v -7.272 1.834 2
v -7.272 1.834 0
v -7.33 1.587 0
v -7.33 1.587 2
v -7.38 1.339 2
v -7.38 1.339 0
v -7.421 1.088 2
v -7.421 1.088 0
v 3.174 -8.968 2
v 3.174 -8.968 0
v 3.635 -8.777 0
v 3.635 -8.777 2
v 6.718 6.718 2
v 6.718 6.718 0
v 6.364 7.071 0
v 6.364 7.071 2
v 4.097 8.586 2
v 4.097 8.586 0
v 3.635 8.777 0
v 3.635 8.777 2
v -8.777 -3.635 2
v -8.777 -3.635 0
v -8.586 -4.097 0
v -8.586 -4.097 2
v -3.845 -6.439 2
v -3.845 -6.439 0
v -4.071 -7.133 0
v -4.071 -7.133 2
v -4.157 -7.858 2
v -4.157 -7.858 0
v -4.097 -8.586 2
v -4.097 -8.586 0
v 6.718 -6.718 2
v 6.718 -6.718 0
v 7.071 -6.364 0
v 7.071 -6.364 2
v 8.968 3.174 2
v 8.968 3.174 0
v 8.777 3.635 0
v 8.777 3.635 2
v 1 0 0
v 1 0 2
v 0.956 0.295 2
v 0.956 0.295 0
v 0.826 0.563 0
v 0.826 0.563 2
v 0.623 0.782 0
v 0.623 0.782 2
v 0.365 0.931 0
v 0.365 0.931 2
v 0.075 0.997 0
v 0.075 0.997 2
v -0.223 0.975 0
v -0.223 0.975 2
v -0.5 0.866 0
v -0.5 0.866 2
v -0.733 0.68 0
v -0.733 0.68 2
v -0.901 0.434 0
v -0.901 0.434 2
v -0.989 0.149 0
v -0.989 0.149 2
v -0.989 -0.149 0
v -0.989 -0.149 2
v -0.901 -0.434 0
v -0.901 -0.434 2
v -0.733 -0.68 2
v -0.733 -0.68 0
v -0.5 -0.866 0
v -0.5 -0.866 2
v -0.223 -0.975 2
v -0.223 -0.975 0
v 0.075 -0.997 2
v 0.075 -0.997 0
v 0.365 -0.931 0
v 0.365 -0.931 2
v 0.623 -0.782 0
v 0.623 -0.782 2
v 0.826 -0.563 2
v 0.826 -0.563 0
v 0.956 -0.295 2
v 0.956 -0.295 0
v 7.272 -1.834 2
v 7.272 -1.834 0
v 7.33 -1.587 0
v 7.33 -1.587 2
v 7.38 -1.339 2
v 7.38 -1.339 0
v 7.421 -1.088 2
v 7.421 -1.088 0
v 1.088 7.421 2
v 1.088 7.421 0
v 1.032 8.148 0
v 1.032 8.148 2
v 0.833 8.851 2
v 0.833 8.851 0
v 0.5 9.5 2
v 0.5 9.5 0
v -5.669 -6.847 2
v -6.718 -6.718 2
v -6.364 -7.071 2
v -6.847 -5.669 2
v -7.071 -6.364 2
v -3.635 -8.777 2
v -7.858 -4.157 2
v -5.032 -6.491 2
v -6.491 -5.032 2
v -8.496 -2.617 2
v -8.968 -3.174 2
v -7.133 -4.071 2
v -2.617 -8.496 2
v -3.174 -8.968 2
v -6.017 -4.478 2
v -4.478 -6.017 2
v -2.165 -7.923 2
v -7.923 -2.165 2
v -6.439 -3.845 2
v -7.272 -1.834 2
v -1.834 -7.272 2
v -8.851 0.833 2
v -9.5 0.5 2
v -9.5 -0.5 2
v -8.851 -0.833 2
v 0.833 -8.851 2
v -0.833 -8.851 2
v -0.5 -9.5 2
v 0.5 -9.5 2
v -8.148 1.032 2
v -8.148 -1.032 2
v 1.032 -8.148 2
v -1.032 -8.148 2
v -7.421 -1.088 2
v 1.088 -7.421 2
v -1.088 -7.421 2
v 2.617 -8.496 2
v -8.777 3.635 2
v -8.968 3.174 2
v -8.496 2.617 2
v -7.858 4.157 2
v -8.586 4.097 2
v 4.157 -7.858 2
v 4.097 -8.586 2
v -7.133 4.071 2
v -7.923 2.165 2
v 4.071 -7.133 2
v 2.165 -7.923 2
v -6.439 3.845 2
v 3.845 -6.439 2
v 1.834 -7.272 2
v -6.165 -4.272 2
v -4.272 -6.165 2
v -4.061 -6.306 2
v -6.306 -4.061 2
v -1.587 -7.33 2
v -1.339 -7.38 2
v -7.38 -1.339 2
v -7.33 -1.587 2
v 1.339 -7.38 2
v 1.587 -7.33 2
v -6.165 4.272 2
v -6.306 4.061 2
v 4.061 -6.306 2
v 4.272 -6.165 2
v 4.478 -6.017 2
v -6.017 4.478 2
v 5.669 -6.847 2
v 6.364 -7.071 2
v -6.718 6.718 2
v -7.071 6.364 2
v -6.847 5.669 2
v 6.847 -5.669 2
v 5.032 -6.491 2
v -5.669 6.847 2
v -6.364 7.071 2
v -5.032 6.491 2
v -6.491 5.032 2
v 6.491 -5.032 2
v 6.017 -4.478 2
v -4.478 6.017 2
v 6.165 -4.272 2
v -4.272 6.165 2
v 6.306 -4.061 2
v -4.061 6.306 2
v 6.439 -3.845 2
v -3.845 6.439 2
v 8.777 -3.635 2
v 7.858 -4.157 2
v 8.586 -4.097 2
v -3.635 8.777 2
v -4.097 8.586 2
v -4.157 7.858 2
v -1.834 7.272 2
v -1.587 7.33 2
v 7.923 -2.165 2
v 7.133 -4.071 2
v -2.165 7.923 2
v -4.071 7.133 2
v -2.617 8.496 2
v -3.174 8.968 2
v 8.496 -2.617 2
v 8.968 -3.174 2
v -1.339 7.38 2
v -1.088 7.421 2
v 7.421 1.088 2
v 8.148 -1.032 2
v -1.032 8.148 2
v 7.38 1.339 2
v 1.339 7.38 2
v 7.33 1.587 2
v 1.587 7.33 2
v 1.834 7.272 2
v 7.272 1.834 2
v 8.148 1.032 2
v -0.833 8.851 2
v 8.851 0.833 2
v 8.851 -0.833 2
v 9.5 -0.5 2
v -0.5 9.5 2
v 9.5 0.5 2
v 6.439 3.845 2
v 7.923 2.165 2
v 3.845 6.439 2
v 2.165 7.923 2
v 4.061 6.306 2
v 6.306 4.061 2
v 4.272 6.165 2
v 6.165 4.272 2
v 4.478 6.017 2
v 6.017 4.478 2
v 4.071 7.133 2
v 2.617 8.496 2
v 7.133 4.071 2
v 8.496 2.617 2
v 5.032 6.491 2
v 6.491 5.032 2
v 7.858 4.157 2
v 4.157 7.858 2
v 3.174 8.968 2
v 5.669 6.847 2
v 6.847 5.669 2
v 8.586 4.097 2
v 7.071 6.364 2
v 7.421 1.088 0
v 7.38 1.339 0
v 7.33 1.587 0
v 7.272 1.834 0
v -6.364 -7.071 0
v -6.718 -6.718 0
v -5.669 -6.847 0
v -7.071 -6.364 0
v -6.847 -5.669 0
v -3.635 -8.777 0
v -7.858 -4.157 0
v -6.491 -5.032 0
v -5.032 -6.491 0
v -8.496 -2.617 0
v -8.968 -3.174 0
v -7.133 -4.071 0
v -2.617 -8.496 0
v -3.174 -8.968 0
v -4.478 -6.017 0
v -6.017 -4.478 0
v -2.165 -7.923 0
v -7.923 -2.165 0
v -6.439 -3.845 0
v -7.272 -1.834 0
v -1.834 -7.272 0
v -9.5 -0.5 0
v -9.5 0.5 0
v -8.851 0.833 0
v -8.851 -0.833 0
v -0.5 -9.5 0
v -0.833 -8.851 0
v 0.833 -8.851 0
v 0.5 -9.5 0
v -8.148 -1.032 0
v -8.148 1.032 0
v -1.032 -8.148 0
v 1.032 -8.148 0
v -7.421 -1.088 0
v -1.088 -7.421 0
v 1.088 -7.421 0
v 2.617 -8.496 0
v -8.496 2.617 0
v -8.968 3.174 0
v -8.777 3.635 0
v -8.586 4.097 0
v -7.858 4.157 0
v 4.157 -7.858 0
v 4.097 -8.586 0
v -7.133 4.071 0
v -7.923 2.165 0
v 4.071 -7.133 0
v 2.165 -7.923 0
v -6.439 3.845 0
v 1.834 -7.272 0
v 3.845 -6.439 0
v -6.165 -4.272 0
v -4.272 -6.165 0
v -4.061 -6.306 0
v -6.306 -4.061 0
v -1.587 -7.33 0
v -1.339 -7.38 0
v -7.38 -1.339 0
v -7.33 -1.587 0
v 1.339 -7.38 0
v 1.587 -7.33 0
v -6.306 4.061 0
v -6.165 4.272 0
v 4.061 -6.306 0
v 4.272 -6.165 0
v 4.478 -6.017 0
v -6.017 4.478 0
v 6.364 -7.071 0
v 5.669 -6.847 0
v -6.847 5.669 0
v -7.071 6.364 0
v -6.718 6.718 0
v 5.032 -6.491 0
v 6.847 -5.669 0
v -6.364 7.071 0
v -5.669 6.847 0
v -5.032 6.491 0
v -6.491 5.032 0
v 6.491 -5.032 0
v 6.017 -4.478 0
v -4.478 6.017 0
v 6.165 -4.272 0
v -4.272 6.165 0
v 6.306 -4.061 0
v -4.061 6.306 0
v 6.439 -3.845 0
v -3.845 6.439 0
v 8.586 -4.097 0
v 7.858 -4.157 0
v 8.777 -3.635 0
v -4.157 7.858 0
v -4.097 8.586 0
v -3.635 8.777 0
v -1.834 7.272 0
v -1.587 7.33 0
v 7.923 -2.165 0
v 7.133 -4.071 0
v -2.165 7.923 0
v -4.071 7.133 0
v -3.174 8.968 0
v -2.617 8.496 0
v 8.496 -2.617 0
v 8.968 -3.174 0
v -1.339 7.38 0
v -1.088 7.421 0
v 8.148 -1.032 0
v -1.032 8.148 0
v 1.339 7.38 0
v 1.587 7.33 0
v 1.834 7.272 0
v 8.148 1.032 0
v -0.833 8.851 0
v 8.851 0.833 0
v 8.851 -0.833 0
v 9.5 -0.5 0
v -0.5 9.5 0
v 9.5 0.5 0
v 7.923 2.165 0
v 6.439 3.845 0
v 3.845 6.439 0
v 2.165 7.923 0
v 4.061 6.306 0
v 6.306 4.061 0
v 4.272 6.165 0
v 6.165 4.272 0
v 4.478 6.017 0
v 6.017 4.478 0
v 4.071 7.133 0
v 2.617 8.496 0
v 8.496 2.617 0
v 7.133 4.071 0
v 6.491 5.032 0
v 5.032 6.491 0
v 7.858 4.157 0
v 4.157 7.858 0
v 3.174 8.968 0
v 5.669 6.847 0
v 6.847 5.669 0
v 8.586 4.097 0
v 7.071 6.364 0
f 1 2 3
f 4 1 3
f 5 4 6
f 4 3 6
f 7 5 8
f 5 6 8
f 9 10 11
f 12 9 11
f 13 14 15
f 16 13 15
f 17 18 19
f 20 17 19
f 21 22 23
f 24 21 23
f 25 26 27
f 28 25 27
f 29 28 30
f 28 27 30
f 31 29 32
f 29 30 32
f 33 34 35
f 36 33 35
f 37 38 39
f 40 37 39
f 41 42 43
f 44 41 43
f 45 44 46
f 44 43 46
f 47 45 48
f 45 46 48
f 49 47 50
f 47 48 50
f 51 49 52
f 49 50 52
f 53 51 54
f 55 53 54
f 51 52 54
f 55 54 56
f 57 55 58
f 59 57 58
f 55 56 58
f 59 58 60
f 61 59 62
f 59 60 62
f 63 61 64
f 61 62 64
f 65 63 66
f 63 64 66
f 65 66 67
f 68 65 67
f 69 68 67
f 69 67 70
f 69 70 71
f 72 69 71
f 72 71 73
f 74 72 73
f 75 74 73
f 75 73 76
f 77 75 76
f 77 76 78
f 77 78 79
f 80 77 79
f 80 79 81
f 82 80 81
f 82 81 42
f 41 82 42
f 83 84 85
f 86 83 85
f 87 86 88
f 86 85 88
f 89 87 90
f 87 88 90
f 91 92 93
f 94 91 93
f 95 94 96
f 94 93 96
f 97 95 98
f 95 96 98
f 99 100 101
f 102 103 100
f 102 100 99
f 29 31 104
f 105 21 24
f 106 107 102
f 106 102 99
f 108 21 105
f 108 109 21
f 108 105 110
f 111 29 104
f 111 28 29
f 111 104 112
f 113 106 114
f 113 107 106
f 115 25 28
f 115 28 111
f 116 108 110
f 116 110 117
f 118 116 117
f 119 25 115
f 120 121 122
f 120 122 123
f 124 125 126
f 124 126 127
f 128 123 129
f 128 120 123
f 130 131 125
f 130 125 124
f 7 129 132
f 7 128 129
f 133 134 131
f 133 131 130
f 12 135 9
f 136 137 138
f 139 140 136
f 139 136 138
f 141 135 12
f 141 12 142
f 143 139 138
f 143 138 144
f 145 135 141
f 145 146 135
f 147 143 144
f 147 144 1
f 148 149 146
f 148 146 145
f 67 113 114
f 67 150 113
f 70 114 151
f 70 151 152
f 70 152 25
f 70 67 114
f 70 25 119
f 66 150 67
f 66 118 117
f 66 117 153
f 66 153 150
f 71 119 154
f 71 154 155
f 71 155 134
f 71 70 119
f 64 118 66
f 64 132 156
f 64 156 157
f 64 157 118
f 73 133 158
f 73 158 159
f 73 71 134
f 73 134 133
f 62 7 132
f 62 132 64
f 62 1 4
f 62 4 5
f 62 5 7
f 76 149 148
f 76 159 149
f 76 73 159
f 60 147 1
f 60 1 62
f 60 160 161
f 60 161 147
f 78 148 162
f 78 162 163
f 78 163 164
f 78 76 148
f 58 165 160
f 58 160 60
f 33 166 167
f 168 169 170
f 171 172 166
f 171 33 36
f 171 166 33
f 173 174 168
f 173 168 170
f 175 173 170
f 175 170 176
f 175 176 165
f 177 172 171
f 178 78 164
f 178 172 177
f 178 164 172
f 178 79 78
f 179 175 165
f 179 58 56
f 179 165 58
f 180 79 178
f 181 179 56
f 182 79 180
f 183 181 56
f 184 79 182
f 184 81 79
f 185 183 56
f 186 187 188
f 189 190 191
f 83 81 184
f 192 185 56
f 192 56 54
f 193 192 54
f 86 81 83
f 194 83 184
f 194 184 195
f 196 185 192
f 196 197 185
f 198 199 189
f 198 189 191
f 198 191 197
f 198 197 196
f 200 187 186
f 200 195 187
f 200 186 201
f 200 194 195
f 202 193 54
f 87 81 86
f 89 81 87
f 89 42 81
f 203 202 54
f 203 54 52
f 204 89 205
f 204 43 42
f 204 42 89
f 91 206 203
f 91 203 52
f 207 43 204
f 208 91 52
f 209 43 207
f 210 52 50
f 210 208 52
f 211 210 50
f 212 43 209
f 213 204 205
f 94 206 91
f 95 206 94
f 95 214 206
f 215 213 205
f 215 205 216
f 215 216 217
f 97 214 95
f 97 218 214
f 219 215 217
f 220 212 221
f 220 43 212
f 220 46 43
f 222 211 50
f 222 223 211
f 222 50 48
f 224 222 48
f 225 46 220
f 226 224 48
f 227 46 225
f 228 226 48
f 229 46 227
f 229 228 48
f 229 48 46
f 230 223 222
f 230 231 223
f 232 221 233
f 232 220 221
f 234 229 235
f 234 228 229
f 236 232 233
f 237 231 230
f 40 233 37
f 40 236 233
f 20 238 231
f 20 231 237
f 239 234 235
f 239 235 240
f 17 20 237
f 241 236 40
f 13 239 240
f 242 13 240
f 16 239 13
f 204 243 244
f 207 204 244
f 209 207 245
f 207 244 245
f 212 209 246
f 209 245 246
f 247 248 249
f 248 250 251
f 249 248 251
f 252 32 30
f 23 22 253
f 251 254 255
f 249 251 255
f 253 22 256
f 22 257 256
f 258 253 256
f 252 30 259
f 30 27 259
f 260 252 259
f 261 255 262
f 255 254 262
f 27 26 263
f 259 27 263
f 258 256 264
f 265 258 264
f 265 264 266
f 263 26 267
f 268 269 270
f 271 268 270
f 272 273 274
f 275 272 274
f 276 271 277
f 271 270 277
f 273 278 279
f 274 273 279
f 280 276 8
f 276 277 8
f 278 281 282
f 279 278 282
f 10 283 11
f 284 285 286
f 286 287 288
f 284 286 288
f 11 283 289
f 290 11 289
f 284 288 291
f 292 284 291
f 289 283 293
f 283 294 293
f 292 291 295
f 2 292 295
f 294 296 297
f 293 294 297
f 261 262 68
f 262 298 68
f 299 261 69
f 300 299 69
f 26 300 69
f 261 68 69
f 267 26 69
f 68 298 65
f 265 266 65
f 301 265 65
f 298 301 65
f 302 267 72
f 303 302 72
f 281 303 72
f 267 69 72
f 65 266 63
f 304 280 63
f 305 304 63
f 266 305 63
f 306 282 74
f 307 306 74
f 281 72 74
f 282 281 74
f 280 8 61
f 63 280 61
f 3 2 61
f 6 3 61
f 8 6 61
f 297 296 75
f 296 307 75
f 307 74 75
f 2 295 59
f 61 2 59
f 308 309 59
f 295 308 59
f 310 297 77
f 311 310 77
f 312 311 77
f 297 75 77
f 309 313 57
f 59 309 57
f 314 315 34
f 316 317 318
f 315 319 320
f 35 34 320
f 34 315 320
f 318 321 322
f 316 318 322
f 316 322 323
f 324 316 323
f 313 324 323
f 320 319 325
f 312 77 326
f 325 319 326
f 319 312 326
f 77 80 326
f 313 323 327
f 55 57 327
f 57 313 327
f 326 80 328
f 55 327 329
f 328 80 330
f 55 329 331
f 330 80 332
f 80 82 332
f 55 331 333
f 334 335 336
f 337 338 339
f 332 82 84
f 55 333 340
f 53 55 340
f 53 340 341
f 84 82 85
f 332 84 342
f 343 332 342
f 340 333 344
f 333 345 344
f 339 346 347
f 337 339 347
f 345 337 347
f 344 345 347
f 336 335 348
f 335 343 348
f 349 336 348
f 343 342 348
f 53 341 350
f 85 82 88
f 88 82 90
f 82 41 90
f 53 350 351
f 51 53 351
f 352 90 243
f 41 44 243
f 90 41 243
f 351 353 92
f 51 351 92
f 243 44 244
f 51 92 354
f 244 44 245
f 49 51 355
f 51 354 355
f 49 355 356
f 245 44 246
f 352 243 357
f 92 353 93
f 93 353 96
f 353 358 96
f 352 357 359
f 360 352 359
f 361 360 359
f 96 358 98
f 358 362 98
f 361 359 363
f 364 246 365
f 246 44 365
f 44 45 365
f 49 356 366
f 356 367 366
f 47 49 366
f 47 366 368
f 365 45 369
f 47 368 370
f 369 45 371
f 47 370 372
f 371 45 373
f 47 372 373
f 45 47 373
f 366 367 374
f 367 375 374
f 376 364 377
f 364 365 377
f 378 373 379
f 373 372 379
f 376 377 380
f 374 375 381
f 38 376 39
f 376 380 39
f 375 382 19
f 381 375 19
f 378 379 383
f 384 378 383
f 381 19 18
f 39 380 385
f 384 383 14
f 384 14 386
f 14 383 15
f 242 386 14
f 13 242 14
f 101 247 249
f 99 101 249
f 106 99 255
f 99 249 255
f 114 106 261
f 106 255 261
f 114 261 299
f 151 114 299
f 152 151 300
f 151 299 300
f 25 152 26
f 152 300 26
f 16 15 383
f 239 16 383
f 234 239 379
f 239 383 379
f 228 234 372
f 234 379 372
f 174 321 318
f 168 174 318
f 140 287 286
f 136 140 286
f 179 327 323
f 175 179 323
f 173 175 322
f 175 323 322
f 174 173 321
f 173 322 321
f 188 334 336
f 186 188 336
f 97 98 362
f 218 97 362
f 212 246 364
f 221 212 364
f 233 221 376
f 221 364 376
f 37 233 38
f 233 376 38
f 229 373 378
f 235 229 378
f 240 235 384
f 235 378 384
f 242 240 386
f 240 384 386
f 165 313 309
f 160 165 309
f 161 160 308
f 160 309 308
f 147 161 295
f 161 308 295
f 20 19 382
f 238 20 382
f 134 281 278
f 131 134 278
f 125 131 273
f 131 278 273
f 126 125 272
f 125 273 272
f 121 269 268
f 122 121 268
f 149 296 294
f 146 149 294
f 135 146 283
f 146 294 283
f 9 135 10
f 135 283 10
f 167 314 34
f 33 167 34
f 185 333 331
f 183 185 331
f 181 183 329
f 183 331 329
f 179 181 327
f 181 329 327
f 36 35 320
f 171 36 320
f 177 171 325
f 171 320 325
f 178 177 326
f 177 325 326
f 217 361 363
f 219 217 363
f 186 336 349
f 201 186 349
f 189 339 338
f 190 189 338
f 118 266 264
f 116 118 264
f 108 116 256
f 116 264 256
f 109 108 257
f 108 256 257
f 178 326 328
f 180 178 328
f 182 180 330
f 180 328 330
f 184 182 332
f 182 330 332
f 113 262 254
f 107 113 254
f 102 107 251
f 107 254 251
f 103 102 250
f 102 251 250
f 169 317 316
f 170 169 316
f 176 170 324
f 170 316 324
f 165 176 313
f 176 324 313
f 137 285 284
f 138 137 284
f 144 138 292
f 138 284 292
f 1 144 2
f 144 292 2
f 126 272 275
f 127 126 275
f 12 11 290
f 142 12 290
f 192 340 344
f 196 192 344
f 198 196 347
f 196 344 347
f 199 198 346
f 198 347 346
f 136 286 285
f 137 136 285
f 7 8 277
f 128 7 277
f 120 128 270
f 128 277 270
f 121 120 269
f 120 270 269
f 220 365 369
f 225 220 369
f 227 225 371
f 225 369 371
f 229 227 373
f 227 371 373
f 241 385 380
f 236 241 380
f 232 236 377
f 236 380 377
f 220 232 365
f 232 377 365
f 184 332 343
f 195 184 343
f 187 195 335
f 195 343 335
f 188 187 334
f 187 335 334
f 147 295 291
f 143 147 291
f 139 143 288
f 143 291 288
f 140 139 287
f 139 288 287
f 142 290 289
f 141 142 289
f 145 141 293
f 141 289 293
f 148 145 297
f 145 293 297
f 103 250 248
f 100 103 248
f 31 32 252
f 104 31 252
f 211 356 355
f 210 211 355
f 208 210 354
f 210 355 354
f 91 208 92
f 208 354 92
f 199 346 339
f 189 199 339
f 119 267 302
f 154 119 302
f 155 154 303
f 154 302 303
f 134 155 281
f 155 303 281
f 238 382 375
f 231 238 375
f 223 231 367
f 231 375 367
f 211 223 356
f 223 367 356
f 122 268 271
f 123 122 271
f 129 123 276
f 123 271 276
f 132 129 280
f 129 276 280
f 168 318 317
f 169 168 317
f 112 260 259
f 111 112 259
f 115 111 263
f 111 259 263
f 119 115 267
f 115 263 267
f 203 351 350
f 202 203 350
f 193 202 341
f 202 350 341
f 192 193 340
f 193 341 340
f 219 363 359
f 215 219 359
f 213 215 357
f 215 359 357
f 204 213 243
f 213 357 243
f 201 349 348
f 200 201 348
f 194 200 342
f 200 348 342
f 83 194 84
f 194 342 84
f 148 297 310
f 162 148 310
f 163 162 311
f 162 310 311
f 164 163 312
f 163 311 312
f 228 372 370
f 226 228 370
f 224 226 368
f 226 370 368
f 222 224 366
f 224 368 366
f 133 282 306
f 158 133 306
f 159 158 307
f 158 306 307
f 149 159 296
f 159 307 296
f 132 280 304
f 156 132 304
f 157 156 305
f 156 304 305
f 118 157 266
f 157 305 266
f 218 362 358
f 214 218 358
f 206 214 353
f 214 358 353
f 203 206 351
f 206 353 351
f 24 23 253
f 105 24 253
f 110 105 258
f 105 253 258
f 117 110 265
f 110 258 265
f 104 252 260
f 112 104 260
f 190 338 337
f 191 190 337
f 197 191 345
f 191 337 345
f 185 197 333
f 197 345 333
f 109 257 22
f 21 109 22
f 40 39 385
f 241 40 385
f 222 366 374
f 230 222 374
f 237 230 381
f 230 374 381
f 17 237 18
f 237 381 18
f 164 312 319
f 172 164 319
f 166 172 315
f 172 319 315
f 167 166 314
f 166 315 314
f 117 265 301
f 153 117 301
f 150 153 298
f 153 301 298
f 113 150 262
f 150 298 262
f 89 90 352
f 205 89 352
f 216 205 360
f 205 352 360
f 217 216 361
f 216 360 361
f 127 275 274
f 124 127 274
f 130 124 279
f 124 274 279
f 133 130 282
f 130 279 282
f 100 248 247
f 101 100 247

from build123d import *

# Parameters (mm, degrees)
F1_DEPTH = 2
F2_R     = 1
F3_DEPTH = 2.001


with BuildPart() as f1:
    # F0 (on Top) → F1 (new body)
    with BuildSketch(Plane.XY):
        with BuildLine():
            ThreePointArc((7.420617, -1.088319), (7.480128, -0.545605), (7.5, 0))
            ThreePointArc((7.5, 0), (7.480128, 0.545605), (7.420617, 1.088319))
            ThreePointArc((7.420617, 1.088319), (7.35589, 1.463177), (7.272238, 1.834271))
            ThreePointArc((7.272238, 1.834271), (6.929096, 2.870126), (6.439275, 3.845223))
            ThreePointArc((6.439275, 3.845223), (6.236022, 4.166777), (6.016727, 4.477611))
            ThreePointArc((6.016727, 4.477611), (5.303301, 5.303301), (4.477611, 6.016727))
            ThreePointArc((4.477611, 6.016727), (4.166777, 6.236022), (3.845223, 6.439275))
            ThreePointArc((3.845223, 6.439275), (2.870126, 6.929096), (1.834271, 7.272238))
            ThreePointArc((1.834271, 7.272238), (1.463177, 7.35589), (1.088319, 7.420617))
            ThreePointArc((1.088319, 7.420617), (0, 7.5), (-1.088319, 7.420617))
            ThreePointArc((-1.088319, 7.420617), (-1.463177, 7.35589), (-1.834271, 7.272238))
            ThreePointArc((-1.834271, 7.272238), (-2.870126, 6.929096), (-3.845223, 6.439275))
            ThreePointArc((-3.845223, 6.439275), (-4.166777, 6.236022), (-4.477611, 6.016727))
            ThreePointArc((-4.477611, 6.016727), (-5.303301, 5.303301), (-6.016727, 4.477611))
            ThreePointArc((-6.016727, 4.477611), (-6.236022, 4.166777), (-6.439275, 3.845223))
            ThreePointArc((-6.439275, 3.845223), (-6.929096, 2.870126), (-7.272238, 1.834271))
            ThreePointArc((-7.272238, 1.834271), (-7.35589, 1.463177), (-7.420617, 1.088319))
            ThreePointArc((-7.420617, 1.088319), (-7.5, 0), (-7.420617, -1.088319))
            ThreePointArc((-7.420617, -1.088319), (-7.35589, -1.463177), (-7.272238, -1.834271))
            ThreePointArc((-7.272238, -1.834271), (-6.929096, -2.870126), (-6.439275, -3.845223))
            ThreePointArc((-6.439275, -3.845223), (-6.236022, -4.166777), (-6.016727, -4.477611))
            ThreePointArc((-6.016727, -4.477611), (-5.303301, -5.303301), (-4.477611, -6.016727))
            ThreePointArc((-4.477611, -6.016727), (-4.166777, -6.236022), (-3.845223, -6.439275))
            ThreePointArc((-3.845223, -6.439275), (-2.870126, -6.929096), (-1.834271, -7.272238))
            ThreePointArc((-1.834271, -7.272238), (-1.463177, -7.35589), (-1.088319, -7.420617))
            ThreePointArc((-1.088319, -7.420617), (0, -7.5), (1.088319, -7.420617))
            ThreePointArc((1.088319, -7.420617), (1.463177, -7.35589), (1.834271, -7.272238))
            ThreePointArc((1.834271, -7.272238), (2.870126, -6.929096), (3.845223, -6.439275))
            ThreePointArc((3.845223, -6.439275), (4.166777, -6.236022), (4.477611, -6.016727))
            ThreePointArc((4.477611, -6.016727), (5.303301, -5.303301), (6.016727, -4.477611))
            ThreePointArc((6.016727, -4.477611), (6.236022, -4.166777), (6.439275, -3.845223))
            ThreePointArc((6.439275, -3.845223), (6.929096, -2.870126), (7.272238, -1.834271))
            ThreePointArc((7.272238, -1.834271), (7.35589, -1.463177), (7.420617, -1.088319))
        make_face()
        with BuildLine():
            ThreePointArc((7.420617, 1.088319), (7.480128, 0.545605), (7.5, 0))
            ThreePointArc((7.5, 0), (7.480128, -0.545605), (7.420617, -1.088319))
            ThreePointArc((7.420617, -1.088319), (8.504352, -0.949828), (9.5, -0.5))
            Line((9.5, -0.5), (9.5, 0))
            Line((9.5, 0), (9.5, 0.5))
            ThreePointArc((9.5, 0.5), (8.504352, 0.949828), (7.420617, 1.088319))
        make_face()
        with BuildLine():
            ThreePointArc((6.439275, 3.845223), (6.929096, 2.870126), (7.272238, 1.834271))
            ThreePointArc((7.272238, 1.834271), (8.22048, 2.376948), (8.968197, 3.173553))
            Line((8.968197, 3.173553), (8.776856, 3.635493))
            Line((8.776856, 3.635493), (8.585514, 4.097432))
            ThreePointArc((8.585514, 4.097432), (7.493513, 4.132001), (6.439275, 3.845223))
        make_face()
        with BuildLine():
            ThreePointArc((8.968197, -3.173553), (8.22048, -2.376948), (7.272238, -1.834271))
            ThreePointArc((7.272238, -1.834271), (6.929096, -2.870126), (6.439275, -3.845223))
            ThreePointArc((6.439275, -3.845223), (7.493513, -4.132001), (8.585514, -4.097432))
            Line((8.585514, -4.097432), (8.776856, -3.635493))
            Line((8.776856, -3.635493), (8.968197, -3.173553))
        make_face()
        with BuildLine():
            ThreePointArc((4.477611, 6.016727), (5.303301, 5.303301), (6.016727, 4.477611))
            ThreePointArc((6.016727, 4.477611), (6.685115, 5.341855), (7.071068, 6.363961))
            Line((7.071068, 6.363961), (6.717514, 6.717514))
            Line((6.717514, 6.717514), (6.363961, 7.071068))
            ThreePointArc((6.363961, 7.071068), (5.341855, 6.685115), (4.477611, 6.016727))
        make_face()
        with BuildLine():
            ThreePointArc((7.071068, -6.363961), (6.685115, -5.341855), (6.016727, -4.477611))
            ThreePointArc((6.016727, -4.477611), (5.303301, -5.303301), (4.477611, -6.016727))
            ThreePointArc((4.477611, -6.016727), (5.341855, -6.685115), (6.363961, -7.071068))
            Line((6.363961, -7.071068), (6.717514, -6.717514))
            Line((6.717514, -6.717514), (7.071068, -6.363961))
        make_face()
        with BuildLine():
            ThreePointArc((1.834271, 7.272238), (2.870126, 6.929096), (3.845223, 6.439275))
            ThreePointArc((3.845223, 6.439275), (4.132001, 7.493513), (4.097432, 8.585514))
            Line((4.097432, 8.585514), (3.635493, 8.776856))
            Line((3.635493, 8.776856), (3.173553, 8.968197))
            ThreePointArc((3.173553, 8.968197), (2.376948, 8.22048), (1.834271, 7.272238))
        make_face()
        with BuildLine():
            ThreePointArc((4.097432, -8.585514), (4.132001, -7.493513), (3.845223, -6.439275))
            ThreePointArc((3.845223, -6.439275), (2.870126, -6.929096), (1.834271, -7.272238))
            ThreePointArc((1.834271, -7.272238), (2.376948, -8.22048), (3.173553, -8.968197))
            Line((3.173553, -8.968197), (3.635493, -8.776856))
            Line((3.635493, -8.776856), (4.097432, -8.585514))
        make_face()
        with BuildLine():
            ThreePointArc((-1.088319, 7.420617), (0, 7.5), (1.088319, 7.420617))
            ThreePointArc((1.088319, 7.420617), (0.949828, 8.504352), (0.5, 9.5))
            Line((0.5, 9.5), (0, 9.5))
            Line((0, 9.5), (-0.5, 9.5))
            ThreePointArc((-0.5, 9.5), (-0.949828, 8.504352), (-1.088319, 7.420617))
        make_face()
        with BuildLine():
            ThreePointArc((0.5, -9.5), (0.949828, -8.504352), (1.088319, -7.420617))
            ThreePointArc((1.088319, -7.420617), (0, -7.5), (-1.088319, -7.420617))
            ThreePointArc((-1.088319, -7.420617), (-0.949828, -8.504352), (-0.5, -9.5))
            Line((-0.5, -9.5), (0, -9.5))
            Line((0, -9.5), (0.5, -9.5))
        make_face()
        with BuildLine():
            ThreePointArc((-3.845223, 6.439275), (-2.870126, 6.929096), (-1.834271, 7.272238))
            ThreePointArc((-1.834271, 7.272238), (-2.376948, 8.22048), (-3.173553, 8.968197))
            Line((-3.173553, 8.968197), (-3.635493, 8.776856))
            Line((-3.635493, 8.776856), (-4.097432, 8.585514))
            ThreePointArc((-4.097432, 8.585514), (-4.132001, 7.493513), (-3.845223, 6.439275))
        make_face()
        with BuildLine():
            ThreePointArc((-3.173553, -8.968197), (-2.376948, -8.22048), (-1.834271, -7.272238))
            ThreePointArc((-1.834271, -7.272238), (-2.870126, -6.929096), (-3.845223, -6.439275))
            ThreePointArc((-3.845223, -6.439275), (-4.132001, -7.493513), (-4.097432, -8.585514))
            Line((-4.097432, -8.585514), (-3.635493, -8.776856))
            Line((-3.635493, -8.776856), (-3.173553, -8.968197))
        make_face()
        with BuildLine():
            ThreePointArc((-6.016727, 4.477611), (-5.303301, 5.303301), (-4.477611, 6.016727))
            ThreePointArc((-4.477611, 6.016727), (-5.341855, 6.685115), (-6.363961, 7.071068))
            Line((-6.363961, 7.071068), (-6.717514, 6.717514))
            Line((-6.717514, 6.717514), (-7.071068, 6.363961))
            ThreePointArc((-7.071068, 6.363961), (-6.685115, 5.341855), (-6.016727, 4.477611))
        make_face()
        with BuildLine():
            ThreePointArc((-6.363961, -7.071068), (-5.341855, -6.685115), (-4.477611, -6.016727))
            ThreePointArc((-4.477611, -6.016727), (-5.303301, -5.303301), (-6.016727, -4.477611))
            ThreePointArc((-6.016727, -4.477611), (-6.685115, -5.341855), (-7.071068, -6.363961))
            Line((-7.071068, -6.363961), (-6.717514, -6.717514))
            Line((-6.717514, -6.717514), (-6.363961, -7.071068))
        make_face()
        with BuildLine():
            ThreePointArc((-7.272238, 1.834271), (-6.929096, 2.870126), (-6.439275, 3.845223))
            ThreePointArc((-6.439275, 3.845223), (-7.493513, 4.132001), (-8.585514, 4.097432))
            Line((-8.585514, 4.097432), (-8.776856, 3.635493))
            Line((-8.776856, 3.635493), (-8.968197, 3.173553))
            ThreePointArc((-8.968197, 3.173553), (-8.22048, 2.376948), (-7.272238, 1.834271))
        make_face()
        with BuildLine():
            ThreePointArc((-8.585514, -4.097432), (-7.493513, -4.132001), (-6.439275, -3.845223))
            ThreePointArc((-6.439275, -3.845223), (-6.929096, -2.870126), (-7.272238, -1.834271))
            ThreePointArc((-7.272238, -1.834271), (-8.22048, -2.376948), (-8.968197, -3.173553))
            Line((-8.968197, -3.173553), (-8.776856, -3.635493))
            Line((-8.776856, -3.635493), (-8.585514, -4.097432))
        make_face()
        with BuildLine():
            ThreePointArc((-7.420617, -1.088319), (-7.5, 0), (-7.420617, 1.088319))
            ThreePointArc((-7.420617, 1.088319), (-8.504352, 0.949828), (-9.5, 0.5))
            Line((-9.5, 0.5), (-9.5, 0))
            Line((-9.5, 0), (-9.5, -0.5))
            ThreePointArc((-9.5, -0.5), (-8.504352, -0.949828), (-7.420617, -1.088319))
        make_face()
    extrude(amount=F1_DEPTH)

    # F2 (on face) → F3 (cut, through all)
    with BuildSketch(Plane.XY.offset(2)):
        Circle(F2_R)
    extrude(amount=-F3_DEPTH, mode=Mode.SUBTRACT)


solid = f1.part
